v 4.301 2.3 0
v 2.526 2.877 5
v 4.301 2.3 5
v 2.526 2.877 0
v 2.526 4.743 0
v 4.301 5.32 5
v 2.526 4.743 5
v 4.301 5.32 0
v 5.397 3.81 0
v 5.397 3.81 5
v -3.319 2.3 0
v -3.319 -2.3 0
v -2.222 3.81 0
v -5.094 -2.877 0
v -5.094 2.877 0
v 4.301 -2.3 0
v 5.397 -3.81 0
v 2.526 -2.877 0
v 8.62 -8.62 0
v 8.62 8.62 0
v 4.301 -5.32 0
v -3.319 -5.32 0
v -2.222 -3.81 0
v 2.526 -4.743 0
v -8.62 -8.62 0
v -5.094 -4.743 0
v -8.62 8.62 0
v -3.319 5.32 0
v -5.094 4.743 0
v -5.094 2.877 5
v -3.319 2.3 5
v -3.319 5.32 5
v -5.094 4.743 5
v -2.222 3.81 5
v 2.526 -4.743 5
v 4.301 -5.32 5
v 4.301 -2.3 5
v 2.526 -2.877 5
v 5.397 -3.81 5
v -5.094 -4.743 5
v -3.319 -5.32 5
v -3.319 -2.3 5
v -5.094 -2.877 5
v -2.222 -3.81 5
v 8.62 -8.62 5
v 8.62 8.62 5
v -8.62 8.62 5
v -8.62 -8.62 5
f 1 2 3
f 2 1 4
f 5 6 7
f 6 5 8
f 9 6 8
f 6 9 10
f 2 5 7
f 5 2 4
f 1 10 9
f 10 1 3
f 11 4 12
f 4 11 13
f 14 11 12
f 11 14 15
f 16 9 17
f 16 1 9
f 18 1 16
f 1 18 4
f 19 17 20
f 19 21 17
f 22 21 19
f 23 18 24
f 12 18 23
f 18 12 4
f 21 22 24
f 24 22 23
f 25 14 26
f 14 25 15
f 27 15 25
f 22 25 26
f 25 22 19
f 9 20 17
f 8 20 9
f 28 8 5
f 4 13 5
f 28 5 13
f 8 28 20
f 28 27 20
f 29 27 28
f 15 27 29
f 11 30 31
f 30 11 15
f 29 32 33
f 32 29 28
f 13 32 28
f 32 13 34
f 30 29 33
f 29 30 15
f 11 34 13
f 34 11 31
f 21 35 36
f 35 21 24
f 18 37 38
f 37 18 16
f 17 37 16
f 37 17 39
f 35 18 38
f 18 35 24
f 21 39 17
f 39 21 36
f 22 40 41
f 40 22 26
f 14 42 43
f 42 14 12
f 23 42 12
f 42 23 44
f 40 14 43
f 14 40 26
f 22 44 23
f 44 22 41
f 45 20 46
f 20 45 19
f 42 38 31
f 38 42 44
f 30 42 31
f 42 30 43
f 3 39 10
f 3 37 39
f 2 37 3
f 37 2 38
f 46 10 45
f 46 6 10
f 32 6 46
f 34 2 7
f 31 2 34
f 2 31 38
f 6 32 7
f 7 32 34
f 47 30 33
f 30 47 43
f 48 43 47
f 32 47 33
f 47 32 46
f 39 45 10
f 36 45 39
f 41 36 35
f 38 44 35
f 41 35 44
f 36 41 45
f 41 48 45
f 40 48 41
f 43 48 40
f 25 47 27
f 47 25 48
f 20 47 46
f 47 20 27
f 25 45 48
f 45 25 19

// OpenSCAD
hole_seperation = 7.62;      //0.3 inches
hole_diameter = 3.175;       //.125 inches
part_thickness = 5;          // 5mm thick

n = 0; //multiples
a=0;
difference() {
    // Base
    translate([0,0,part_thickness/2])
    cube([((n+2)*hole_seperation)+2,((n+2)*hole_seperation)+2,part_thickness],center=true);
    
    // Holes
    for(a=[0:n]) {
        echo(a);
        translate([((hole_seperation/2)+hole_seperation/2*a),((hole_seperation/2)+hole_seperation/2*a),0])
        cylinder(h=part_thickness*4, r=hole_diameter/2);

        translate([-((hole_seperation/2)+hole_seperation/2*a),((hole_seperation/2)+hole_seperation/2*a),0])
        cylinder(h=part_thickness*4, r=hole_diameter/2);
      
        translate([((hole_seperation/2)+hole_seperation/2*a),-((hole_seperation/2)+hole_seperation/2*a),0])
        cylinder(h=part_thickness*4, r=hole_diameter/2);

        translate([-((hole_seperation/2)+hole_seperation/2*a),-((hole_seperation/2)+hole_seperation/2*a),0])
        cylinder(h=part_thickness*4, r=hole_diameter/2);  
    }
}     
 
